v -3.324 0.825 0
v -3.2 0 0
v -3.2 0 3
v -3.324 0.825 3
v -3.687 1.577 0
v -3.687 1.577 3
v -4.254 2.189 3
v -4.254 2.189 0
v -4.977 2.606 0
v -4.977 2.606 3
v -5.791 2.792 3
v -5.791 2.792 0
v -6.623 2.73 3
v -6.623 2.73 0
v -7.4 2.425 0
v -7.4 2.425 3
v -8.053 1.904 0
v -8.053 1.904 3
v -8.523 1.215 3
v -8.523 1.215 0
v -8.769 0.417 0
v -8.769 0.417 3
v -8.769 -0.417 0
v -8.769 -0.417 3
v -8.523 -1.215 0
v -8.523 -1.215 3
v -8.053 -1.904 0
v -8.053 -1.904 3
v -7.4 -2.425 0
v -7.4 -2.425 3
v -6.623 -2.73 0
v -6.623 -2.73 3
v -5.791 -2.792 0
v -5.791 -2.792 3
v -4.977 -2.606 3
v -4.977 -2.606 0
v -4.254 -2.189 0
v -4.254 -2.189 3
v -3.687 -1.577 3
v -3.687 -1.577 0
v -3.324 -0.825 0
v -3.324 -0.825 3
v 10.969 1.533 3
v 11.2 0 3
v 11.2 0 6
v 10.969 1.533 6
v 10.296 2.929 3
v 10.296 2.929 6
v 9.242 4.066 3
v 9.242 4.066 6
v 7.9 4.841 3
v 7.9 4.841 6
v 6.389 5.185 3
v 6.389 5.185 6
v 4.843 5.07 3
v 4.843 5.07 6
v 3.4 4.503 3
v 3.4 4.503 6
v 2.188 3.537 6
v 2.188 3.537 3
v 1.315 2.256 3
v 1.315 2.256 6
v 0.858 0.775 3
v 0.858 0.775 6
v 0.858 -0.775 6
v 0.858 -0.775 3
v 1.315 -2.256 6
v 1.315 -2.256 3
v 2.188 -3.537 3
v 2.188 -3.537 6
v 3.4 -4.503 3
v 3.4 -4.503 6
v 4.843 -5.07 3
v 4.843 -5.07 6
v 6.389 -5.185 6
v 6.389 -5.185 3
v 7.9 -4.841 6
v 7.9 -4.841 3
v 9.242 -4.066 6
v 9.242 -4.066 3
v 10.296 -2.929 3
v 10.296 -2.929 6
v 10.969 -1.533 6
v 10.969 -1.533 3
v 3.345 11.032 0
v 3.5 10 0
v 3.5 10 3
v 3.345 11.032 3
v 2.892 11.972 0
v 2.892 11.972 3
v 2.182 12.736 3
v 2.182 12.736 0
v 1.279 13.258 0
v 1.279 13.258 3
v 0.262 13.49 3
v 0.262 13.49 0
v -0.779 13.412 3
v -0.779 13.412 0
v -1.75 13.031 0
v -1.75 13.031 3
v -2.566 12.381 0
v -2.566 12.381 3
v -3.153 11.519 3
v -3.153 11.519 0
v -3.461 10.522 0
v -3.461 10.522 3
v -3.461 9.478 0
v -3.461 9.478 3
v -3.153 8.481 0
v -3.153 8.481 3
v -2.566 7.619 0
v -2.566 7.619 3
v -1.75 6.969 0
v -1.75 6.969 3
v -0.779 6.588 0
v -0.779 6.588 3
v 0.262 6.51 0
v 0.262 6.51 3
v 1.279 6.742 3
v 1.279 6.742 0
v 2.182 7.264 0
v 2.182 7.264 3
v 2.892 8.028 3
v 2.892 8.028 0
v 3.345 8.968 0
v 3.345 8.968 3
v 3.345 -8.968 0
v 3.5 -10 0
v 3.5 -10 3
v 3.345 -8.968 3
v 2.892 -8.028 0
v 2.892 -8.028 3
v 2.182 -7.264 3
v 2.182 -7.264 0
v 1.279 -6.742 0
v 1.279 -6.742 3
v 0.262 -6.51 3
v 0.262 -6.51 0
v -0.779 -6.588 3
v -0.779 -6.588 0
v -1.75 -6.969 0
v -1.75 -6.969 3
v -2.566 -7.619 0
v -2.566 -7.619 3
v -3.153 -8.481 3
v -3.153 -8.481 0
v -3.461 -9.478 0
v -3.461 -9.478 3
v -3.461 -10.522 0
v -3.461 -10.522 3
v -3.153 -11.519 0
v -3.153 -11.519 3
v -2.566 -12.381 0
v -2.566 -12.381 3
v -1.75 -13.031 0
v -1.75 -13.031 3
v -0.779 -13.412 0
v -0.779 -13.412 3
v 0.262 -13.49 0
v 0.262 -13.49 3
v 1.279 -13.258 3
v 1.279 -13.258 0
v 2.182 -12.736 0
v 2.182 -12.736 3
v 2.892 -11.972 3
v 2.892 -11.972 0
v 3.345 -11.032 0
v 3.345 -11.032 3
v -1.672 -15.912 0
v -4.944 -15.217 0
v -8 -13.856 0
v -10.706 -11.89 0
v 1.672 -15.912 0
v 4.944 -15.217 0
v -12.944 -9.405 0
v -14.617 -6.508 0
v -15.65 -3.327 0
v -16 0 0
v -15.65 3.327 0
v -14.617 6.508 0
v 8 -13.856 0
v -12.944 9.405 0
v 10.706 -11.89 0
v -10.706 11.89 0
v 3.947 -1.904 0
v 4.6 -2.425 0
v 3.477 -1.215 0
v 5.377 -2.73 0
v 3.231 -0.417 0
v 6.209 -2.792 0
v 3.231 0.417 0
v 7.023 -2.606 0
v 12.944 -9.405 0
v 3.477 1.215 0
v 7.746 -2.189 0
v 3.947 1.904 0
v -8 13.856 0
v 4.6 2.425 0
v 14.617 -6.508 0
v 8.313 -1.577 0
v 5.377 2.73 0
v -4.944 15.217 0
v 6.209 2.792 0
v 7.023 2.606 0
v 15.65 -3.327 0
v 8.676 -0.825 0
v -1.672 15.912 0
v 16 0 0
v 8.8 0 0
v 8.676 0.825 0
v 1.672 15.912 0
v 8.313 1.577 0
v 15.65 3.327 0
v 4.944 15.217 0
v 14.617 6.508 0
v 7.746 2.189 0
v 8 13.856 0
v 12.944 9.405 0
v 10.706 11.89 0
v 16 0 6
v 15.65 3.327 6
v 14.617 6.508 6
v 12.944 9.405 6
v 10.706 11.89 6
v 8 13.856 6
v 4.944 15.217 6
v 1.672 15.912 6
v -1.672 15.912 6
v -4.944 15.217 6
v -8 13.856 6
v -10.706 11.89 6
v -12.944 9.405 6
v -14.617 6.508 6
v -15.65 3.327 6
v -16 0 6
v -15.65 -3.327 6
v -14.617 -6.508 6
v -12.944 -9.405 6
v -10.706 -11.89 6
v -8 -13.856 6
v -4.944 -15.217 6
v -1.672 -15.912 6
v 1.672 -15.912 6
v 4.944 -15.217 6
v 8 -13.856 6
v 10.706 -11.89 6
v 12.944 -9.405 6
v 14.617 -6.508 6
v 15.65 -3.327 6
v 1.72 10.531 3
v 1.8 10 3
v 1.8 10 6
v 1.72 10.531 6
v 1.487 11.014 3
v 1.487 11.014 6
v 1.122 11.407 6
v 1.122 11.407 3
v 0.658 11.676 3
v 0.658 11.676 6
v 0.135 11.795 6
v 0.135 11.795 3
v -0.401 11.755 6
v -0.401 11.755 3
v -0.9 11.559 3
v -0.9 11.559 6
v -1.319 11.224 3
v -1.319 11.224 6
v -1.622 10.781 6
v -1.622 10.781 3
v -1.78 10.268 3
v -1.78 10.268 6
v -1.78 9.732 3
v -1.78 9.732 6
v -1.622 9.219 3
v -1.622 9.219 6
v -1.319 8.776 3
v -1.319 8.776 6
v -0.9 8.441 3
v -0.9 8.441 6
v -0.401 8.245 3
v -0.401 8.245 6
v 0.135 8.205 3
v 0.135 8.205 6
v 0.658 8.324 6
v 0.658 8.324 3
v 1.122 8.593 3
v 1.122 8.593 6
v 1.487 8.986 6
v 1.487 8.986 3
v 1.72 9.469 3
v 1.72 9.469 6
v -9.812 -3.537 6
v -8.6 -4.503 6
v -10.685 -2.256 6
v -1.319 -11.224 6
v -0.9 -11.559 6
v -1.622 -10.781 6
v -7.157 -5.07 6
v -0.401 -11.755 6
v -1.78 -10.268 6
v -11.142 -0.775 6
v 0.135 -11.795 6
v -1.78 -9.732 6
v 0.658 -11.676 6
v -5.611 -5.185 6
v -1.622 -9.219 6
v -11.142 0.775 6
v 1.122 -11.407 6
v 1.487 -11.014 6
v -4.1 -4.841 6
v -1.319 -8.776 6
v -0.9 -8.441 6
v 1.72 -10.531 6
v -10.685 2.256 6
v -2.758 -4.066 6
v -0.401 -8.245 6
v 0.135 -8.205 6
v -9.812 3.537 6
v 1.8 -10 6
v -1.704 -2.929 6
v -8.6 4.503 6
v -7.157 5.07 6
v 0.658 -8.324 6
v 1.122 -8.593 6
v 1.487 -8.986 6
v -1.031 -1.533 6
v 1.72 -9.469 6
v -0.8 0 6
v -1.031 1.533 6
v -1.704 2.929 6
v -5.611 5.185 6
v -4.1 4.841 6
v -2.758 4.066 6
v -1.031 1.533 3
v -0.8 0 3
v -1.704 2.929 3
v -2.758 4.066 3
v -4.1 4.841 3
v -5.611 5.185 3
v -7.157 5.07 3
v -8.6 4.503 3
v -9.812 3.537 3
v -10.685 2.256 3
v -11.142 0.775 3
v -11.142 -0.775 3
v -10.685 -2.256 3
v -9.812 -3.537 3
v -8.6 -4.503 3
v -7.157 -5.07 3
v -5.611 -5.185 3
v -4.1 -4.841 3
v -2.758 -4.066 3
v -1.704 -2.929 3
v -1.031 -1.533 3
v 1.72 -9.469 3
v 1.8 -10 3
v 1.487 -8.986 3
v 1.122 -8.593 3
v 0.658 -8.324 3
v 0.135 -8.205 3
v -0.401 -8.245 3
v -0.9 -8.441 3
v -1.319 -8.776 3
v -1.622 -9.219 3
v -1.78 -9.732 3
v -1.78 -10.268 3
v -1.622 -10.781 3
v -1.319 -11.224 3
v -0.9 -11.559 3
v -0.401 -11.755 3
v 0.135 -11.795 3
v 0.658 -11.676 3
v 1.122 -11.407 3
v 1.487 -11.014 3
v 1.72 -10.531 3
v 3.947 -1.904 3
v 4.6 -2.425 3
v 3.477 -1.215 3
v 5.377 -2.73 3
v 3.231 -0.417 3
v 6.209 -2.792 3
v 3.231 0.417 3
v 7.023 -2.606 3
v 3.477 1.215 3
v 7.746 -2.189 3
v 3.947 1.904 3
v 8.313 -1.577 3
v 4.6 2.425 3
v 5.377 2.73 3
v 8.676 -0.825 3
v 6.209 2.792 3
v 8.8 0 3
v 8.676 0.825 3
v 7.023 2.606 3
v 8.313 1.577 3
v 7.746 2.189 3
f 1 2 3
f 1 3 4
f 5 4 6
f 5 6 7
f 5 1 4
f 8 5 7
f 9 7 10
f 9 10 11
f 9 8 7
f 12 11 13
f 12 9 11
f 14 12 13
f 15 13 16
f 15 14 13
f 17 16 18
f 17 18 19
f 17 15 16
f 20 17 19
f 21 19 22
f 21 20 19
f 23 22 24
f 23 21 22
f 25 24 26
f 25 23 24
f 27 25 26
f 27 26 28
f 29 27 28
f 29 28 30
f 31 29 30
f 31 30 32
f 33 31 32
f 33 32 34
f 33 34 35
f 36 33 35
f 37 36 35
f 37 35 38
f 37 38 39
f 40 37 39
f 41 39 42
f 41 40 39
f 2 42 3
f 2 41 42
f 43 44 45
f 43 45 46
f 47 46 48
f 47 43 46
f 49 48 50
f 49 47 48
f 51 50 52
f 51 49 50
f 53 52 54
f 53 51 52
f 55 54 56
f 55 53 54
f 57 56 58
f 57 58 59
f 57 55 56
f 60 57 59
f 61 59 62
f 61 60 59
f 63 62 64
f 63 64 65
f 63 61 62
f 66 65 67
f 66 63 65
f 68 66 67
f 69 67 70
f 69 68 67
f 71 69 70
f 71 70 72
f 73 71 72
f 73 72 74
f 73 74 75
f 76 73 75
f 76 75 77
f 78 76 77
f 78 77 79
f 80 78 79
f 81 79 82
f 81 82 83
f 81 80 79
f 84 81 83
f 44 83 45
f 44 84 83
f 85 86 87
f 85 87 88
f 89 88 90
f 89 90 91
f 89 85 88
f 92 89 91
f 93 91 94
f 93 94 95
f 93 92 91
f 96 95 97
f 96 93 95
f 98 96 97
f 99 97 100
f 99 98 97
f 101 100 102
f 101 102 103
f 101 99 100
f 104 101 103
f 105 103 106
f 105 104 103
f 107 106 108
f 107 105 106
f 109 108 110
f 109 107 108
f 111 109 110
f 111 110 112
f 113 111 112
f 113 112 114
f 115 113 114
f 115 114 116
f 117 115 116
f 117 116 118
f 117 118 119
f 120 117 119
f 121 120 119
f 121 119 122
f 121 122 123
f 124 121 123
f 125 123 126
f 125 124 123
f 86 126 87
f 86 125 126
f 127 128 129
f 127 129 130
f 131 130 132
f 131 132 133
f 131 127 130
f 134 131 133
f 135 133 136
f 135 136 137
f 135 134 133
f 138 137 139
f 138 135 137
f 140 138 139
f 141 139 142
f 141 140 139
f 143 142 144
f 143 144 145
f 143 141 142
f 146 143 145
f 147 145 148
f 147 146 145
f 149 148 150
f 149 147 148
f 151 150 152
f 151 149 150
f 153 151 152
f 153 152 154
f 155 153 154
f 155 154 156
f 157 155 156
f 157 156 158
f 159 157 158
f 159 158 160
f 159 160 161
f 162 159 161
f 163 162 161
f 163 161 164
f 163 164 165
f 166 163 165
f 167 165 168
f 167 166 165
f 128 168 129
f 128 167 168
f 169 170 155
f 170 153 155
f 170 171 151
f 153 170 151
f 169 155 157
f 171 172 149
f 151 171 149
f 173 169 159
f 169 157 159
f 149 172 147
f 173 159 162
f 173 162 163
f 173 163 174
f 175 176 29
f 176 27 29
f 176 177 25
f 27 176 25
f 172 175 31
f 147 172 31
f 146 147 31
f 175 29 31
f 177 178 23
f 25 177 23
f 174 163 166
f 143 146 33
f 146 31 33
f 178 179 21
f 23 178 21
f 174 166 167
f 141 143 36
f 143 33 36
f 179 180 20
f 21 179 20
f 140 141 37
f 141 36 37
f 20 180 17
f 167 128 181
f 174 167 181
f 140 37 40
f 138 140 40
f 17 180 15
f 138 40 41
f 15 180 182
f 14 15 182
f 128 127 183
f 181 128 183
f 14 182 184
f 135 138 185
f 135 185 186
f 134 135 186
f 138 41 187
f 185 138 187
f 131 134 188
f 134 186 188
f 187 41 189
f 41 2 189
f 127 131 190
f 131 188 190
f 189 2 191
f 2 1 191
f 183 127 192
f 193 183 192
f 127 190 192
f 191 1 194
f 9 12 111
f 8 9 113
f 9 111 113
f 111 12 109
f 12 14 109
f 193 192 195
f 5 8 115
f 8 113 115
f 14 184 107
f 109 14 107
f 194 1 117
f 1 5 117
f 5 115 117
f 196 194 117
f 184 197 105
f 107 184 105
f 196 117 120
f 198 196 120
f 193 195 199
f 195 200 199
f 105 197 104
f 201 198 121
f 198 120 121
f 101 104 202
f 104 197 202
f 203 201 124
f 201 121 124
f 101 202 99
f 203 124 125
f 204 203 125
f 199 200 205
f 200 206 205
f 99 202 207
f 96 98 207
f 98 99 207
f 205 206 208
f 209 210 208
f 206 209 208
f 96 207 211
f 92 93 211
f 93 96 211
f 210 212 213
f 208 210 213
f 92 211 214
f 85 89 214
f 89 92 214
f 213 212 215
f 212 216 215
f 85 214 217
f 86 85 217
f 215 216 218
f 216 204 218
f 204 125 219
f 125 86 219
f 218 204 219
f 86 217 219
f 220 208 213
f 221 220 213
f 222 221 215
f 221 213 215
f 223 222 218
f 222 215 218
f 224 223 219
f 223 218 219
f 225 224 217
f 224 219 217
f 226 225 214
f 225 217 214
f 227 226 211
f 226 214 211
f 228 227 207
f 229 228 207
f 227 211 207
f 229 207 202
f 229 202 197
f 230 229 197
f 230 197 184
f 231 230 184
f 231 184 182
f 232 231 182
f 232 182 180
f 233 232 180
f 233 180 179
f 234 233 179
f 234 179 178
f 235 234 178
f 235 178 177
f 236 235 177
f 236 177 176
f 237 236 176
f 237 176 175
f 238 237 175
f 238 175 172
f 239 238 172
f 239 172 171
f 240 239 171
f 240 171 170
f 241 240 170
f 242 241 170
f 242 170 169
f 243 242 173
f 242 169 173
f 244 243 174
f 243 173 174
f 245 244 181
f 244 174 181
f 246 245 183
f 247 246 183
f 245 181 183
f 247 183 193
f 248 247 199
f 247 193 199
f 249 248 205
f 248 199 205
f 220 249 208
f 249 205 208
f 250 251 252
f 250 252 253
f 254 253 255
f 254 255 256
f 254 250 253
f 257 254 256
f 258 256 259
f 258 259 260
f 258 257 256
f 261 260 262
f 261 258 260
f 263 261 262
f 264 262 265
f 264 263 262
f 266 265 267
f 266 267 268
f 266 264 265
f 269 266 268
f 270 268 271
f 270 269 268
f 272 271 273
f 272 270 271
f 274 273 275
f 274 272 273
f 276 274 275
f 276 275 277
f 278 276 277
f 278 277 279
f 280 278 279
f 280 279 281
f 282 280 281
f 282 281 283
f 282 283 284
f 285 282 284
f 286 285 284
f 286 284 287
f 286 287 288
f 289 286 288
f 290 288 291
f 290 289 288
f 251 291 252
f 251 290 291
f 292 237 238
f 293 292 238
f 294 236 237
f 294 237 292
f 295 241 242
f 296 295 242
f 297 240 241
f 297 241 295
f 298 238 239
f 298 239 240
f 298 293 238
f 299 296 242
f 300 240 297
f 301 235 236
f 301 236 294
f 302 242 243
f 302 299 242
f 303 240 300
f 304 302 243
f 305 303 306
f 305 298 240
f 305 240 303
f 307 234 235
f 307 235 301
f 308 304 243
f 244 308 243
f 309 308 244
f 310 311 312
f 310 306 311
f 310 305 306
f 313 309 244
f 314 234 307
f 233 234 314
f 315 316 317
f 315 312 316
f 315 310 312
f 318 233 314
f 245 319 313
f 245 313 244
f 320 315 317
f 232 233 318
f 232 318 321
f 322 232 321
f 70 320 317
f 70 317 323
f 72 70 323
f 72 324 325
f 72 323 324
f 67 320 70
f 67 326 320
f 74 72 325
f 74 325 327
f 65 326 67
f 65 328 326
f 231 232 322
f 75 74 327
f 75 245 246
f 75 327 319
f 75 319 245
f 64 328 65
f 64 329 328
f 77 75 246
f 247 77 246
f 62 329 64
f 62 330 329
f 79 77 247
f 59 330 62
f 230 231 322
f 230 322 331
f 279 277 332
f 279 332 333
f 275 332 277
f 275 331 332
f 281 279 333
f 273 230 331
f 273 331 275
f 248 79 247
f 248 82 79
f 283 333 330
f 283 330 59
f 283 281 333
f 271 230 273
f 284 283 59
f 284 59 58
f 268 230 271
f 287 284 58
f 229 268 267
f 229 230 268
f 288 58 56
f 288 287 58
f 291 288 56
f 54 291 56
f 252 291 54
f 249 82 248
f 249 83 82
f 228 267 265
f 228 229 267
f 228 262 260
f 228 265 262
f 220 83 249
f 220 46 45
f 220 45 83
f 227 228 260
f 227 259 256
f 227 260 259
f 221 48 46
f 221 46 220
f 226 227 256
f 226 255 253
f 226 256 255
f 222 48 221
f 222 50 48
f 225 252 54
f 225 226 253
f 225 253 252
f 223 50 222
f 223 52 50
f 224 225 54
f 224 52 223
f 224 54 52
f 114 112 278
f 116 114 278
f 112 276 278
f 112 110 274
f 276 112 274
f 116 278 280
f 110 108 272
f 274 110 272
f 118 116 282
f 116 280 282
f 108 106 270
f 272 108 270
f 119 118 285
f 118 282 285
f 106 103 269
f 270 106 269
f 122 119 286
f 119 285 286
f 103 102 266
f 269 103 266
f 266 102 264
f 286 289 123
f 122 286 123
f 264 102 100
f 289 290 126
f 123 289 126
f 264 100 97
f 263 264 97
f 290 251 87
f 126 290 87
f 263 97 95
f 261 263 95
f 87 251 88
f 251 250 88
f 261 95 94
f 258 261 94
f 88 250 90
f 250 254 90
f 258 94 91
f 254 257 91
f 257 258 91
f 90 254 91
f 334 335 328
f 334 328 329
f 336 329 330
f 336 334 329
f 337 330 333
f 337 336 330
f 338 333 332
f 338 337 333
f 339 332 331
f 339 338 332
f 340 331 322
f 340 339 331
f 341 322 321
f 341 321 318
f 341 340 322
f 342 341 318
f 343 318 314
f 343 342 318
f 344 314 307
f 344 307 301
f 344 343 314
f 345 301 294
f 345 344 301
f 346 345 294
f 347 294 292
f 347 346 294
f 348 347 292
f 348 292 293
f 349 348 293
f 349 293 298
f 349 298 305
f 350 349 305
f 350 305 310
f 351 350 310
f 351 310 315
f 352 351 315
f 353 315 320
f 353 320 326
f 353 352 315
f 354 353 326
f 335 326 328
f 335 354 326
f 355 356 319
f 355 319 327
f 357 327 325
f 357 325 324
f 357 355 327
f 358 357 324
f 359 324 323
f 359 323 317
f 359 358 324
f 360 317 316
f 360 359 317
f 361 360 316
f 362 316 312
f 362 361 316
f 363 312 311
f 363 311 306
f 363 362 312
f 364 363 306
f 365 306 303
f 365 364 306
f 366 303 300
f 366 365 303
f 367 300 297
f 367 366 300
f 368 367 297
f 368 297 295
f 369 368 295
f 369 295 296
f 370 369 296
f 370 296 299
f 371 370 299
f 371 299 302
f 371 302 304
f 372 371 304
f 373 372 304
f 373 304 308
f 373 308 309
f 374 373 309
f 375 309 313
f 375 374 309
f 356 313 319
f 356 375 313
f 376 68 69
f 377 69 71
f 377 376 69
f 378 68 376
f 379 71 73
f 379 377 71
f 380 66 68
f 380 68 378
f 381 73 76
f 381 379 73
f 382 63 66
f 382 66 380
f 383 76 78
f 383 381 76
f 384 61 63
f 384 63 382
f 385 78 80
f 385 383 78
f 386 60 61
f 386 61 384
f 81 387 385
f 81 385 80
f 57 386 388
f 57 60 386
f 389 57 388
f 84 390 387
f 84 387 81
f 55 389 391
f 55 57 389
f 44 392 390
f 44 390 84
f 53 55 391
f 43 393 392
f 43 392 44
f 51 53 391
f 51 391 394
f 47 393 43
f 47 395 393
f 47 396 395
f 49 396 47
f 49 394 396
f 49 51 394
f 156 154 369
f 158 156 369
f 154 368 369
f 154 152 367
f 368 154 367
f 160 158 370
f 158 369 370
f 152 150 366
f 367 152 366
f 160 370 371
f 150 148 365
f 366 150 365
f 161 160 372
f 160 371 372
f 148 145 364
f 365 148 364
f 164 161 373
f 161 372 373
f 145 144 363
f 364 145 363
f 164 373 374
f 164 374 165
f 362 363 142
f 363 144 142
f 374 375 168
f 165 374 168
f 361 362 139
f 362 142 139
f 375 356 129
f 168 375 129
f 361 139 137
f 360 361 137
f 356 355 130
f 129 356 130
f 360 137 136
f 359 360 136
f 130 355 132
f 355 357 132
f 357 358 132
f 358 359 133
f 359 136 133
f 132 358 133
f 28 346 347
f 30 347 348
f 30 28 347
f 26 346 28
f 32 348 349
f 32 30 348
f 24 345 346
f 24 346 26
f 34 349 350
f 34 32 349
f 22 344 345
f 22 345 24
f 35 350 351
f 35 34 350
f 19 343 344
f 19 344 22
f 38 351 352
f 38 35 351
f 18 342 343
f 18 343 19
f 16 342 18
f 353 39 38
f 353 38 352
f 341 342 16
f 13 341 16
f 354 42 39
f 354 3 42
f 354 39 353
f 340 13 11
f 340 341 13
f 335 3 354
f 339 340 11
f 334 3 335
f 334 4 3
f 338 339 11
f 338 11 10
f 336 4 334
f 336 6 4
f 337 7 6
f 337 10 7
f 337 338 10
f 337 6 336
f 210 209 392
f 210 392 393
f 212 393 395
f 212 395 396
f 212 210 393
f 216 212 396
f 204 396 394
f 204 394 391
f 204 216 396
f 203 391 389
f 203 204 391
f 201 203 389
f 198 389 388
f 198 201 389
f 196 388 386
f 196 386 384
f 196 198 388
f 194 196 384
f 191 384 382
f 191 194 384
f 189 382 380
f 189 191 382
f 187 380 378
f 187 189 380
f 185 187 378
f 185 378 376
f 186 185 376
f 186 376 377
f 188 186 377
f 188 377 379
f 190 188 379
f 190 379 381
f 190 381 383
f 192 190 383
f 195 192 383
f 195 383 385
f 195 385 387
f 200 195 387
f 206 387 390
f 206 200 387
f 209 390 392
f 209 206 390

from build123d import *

# Parameters (mm, degrees)
SKETCH_R      = 16
SKETCH_R_2    = 2.8
SKETCH_R_3    = 3.5
PAD_DEPTH     = 3
SKETCH001_R   = 16
SKETCH001_R_2 = 5.2
SKETCH001_R_3 = 1.8
PAD001_DEPTH  = 3


with BuildPart() as pad:
    # Sketch → Pad (new body)
    with BuildSketch(Plane.XY):
        Circle(SKETCH_R)
        with Locations((-6, 0)):
            Circle(SKETCH_R_2, mode=Mode.SUBTRACT)
        with Locations((6, 0)):
            Circle(SKETCH_R_2, mode=Mode.SUBTRACT)
        with Locations((0, 10)):
            Circle(SKETCH_R_3, mode=Mode.SUBTRACT)
        with Locations((0, -10)):
            Circle(SKETCH_R_3, mode=Mode.SUBTRACT)
    extrude(amount=PAD_DEPTH)


with BuildPart() as fusion:
    # Sketch001 → Pad001 (new body)
    with BuildSketch(Plane.XY.offset(3)):
        Circle(SKETCH001_R)
        with Locations((-6, 0)):
            Circle(SKETCH001_R_2, mode=Mode.SUBTRACT)
        with Locations((6, 0)):
            Circle(SKETCH001_R_2, mode=Mode.SUBTRACT)
        with Locations((0, 10)):
            Circle(SKETCH001_R_3, mode=Mode.SUBTRACT)
        with Locations((0, -10)):
            Circle(SKETCH001_R_3, mode=Mode.SUBTRACT)
    extrude(amount=PAD001_DEPTH)

    # Fusion: union Pad
    add(pad.part)


solid = fusion.part
